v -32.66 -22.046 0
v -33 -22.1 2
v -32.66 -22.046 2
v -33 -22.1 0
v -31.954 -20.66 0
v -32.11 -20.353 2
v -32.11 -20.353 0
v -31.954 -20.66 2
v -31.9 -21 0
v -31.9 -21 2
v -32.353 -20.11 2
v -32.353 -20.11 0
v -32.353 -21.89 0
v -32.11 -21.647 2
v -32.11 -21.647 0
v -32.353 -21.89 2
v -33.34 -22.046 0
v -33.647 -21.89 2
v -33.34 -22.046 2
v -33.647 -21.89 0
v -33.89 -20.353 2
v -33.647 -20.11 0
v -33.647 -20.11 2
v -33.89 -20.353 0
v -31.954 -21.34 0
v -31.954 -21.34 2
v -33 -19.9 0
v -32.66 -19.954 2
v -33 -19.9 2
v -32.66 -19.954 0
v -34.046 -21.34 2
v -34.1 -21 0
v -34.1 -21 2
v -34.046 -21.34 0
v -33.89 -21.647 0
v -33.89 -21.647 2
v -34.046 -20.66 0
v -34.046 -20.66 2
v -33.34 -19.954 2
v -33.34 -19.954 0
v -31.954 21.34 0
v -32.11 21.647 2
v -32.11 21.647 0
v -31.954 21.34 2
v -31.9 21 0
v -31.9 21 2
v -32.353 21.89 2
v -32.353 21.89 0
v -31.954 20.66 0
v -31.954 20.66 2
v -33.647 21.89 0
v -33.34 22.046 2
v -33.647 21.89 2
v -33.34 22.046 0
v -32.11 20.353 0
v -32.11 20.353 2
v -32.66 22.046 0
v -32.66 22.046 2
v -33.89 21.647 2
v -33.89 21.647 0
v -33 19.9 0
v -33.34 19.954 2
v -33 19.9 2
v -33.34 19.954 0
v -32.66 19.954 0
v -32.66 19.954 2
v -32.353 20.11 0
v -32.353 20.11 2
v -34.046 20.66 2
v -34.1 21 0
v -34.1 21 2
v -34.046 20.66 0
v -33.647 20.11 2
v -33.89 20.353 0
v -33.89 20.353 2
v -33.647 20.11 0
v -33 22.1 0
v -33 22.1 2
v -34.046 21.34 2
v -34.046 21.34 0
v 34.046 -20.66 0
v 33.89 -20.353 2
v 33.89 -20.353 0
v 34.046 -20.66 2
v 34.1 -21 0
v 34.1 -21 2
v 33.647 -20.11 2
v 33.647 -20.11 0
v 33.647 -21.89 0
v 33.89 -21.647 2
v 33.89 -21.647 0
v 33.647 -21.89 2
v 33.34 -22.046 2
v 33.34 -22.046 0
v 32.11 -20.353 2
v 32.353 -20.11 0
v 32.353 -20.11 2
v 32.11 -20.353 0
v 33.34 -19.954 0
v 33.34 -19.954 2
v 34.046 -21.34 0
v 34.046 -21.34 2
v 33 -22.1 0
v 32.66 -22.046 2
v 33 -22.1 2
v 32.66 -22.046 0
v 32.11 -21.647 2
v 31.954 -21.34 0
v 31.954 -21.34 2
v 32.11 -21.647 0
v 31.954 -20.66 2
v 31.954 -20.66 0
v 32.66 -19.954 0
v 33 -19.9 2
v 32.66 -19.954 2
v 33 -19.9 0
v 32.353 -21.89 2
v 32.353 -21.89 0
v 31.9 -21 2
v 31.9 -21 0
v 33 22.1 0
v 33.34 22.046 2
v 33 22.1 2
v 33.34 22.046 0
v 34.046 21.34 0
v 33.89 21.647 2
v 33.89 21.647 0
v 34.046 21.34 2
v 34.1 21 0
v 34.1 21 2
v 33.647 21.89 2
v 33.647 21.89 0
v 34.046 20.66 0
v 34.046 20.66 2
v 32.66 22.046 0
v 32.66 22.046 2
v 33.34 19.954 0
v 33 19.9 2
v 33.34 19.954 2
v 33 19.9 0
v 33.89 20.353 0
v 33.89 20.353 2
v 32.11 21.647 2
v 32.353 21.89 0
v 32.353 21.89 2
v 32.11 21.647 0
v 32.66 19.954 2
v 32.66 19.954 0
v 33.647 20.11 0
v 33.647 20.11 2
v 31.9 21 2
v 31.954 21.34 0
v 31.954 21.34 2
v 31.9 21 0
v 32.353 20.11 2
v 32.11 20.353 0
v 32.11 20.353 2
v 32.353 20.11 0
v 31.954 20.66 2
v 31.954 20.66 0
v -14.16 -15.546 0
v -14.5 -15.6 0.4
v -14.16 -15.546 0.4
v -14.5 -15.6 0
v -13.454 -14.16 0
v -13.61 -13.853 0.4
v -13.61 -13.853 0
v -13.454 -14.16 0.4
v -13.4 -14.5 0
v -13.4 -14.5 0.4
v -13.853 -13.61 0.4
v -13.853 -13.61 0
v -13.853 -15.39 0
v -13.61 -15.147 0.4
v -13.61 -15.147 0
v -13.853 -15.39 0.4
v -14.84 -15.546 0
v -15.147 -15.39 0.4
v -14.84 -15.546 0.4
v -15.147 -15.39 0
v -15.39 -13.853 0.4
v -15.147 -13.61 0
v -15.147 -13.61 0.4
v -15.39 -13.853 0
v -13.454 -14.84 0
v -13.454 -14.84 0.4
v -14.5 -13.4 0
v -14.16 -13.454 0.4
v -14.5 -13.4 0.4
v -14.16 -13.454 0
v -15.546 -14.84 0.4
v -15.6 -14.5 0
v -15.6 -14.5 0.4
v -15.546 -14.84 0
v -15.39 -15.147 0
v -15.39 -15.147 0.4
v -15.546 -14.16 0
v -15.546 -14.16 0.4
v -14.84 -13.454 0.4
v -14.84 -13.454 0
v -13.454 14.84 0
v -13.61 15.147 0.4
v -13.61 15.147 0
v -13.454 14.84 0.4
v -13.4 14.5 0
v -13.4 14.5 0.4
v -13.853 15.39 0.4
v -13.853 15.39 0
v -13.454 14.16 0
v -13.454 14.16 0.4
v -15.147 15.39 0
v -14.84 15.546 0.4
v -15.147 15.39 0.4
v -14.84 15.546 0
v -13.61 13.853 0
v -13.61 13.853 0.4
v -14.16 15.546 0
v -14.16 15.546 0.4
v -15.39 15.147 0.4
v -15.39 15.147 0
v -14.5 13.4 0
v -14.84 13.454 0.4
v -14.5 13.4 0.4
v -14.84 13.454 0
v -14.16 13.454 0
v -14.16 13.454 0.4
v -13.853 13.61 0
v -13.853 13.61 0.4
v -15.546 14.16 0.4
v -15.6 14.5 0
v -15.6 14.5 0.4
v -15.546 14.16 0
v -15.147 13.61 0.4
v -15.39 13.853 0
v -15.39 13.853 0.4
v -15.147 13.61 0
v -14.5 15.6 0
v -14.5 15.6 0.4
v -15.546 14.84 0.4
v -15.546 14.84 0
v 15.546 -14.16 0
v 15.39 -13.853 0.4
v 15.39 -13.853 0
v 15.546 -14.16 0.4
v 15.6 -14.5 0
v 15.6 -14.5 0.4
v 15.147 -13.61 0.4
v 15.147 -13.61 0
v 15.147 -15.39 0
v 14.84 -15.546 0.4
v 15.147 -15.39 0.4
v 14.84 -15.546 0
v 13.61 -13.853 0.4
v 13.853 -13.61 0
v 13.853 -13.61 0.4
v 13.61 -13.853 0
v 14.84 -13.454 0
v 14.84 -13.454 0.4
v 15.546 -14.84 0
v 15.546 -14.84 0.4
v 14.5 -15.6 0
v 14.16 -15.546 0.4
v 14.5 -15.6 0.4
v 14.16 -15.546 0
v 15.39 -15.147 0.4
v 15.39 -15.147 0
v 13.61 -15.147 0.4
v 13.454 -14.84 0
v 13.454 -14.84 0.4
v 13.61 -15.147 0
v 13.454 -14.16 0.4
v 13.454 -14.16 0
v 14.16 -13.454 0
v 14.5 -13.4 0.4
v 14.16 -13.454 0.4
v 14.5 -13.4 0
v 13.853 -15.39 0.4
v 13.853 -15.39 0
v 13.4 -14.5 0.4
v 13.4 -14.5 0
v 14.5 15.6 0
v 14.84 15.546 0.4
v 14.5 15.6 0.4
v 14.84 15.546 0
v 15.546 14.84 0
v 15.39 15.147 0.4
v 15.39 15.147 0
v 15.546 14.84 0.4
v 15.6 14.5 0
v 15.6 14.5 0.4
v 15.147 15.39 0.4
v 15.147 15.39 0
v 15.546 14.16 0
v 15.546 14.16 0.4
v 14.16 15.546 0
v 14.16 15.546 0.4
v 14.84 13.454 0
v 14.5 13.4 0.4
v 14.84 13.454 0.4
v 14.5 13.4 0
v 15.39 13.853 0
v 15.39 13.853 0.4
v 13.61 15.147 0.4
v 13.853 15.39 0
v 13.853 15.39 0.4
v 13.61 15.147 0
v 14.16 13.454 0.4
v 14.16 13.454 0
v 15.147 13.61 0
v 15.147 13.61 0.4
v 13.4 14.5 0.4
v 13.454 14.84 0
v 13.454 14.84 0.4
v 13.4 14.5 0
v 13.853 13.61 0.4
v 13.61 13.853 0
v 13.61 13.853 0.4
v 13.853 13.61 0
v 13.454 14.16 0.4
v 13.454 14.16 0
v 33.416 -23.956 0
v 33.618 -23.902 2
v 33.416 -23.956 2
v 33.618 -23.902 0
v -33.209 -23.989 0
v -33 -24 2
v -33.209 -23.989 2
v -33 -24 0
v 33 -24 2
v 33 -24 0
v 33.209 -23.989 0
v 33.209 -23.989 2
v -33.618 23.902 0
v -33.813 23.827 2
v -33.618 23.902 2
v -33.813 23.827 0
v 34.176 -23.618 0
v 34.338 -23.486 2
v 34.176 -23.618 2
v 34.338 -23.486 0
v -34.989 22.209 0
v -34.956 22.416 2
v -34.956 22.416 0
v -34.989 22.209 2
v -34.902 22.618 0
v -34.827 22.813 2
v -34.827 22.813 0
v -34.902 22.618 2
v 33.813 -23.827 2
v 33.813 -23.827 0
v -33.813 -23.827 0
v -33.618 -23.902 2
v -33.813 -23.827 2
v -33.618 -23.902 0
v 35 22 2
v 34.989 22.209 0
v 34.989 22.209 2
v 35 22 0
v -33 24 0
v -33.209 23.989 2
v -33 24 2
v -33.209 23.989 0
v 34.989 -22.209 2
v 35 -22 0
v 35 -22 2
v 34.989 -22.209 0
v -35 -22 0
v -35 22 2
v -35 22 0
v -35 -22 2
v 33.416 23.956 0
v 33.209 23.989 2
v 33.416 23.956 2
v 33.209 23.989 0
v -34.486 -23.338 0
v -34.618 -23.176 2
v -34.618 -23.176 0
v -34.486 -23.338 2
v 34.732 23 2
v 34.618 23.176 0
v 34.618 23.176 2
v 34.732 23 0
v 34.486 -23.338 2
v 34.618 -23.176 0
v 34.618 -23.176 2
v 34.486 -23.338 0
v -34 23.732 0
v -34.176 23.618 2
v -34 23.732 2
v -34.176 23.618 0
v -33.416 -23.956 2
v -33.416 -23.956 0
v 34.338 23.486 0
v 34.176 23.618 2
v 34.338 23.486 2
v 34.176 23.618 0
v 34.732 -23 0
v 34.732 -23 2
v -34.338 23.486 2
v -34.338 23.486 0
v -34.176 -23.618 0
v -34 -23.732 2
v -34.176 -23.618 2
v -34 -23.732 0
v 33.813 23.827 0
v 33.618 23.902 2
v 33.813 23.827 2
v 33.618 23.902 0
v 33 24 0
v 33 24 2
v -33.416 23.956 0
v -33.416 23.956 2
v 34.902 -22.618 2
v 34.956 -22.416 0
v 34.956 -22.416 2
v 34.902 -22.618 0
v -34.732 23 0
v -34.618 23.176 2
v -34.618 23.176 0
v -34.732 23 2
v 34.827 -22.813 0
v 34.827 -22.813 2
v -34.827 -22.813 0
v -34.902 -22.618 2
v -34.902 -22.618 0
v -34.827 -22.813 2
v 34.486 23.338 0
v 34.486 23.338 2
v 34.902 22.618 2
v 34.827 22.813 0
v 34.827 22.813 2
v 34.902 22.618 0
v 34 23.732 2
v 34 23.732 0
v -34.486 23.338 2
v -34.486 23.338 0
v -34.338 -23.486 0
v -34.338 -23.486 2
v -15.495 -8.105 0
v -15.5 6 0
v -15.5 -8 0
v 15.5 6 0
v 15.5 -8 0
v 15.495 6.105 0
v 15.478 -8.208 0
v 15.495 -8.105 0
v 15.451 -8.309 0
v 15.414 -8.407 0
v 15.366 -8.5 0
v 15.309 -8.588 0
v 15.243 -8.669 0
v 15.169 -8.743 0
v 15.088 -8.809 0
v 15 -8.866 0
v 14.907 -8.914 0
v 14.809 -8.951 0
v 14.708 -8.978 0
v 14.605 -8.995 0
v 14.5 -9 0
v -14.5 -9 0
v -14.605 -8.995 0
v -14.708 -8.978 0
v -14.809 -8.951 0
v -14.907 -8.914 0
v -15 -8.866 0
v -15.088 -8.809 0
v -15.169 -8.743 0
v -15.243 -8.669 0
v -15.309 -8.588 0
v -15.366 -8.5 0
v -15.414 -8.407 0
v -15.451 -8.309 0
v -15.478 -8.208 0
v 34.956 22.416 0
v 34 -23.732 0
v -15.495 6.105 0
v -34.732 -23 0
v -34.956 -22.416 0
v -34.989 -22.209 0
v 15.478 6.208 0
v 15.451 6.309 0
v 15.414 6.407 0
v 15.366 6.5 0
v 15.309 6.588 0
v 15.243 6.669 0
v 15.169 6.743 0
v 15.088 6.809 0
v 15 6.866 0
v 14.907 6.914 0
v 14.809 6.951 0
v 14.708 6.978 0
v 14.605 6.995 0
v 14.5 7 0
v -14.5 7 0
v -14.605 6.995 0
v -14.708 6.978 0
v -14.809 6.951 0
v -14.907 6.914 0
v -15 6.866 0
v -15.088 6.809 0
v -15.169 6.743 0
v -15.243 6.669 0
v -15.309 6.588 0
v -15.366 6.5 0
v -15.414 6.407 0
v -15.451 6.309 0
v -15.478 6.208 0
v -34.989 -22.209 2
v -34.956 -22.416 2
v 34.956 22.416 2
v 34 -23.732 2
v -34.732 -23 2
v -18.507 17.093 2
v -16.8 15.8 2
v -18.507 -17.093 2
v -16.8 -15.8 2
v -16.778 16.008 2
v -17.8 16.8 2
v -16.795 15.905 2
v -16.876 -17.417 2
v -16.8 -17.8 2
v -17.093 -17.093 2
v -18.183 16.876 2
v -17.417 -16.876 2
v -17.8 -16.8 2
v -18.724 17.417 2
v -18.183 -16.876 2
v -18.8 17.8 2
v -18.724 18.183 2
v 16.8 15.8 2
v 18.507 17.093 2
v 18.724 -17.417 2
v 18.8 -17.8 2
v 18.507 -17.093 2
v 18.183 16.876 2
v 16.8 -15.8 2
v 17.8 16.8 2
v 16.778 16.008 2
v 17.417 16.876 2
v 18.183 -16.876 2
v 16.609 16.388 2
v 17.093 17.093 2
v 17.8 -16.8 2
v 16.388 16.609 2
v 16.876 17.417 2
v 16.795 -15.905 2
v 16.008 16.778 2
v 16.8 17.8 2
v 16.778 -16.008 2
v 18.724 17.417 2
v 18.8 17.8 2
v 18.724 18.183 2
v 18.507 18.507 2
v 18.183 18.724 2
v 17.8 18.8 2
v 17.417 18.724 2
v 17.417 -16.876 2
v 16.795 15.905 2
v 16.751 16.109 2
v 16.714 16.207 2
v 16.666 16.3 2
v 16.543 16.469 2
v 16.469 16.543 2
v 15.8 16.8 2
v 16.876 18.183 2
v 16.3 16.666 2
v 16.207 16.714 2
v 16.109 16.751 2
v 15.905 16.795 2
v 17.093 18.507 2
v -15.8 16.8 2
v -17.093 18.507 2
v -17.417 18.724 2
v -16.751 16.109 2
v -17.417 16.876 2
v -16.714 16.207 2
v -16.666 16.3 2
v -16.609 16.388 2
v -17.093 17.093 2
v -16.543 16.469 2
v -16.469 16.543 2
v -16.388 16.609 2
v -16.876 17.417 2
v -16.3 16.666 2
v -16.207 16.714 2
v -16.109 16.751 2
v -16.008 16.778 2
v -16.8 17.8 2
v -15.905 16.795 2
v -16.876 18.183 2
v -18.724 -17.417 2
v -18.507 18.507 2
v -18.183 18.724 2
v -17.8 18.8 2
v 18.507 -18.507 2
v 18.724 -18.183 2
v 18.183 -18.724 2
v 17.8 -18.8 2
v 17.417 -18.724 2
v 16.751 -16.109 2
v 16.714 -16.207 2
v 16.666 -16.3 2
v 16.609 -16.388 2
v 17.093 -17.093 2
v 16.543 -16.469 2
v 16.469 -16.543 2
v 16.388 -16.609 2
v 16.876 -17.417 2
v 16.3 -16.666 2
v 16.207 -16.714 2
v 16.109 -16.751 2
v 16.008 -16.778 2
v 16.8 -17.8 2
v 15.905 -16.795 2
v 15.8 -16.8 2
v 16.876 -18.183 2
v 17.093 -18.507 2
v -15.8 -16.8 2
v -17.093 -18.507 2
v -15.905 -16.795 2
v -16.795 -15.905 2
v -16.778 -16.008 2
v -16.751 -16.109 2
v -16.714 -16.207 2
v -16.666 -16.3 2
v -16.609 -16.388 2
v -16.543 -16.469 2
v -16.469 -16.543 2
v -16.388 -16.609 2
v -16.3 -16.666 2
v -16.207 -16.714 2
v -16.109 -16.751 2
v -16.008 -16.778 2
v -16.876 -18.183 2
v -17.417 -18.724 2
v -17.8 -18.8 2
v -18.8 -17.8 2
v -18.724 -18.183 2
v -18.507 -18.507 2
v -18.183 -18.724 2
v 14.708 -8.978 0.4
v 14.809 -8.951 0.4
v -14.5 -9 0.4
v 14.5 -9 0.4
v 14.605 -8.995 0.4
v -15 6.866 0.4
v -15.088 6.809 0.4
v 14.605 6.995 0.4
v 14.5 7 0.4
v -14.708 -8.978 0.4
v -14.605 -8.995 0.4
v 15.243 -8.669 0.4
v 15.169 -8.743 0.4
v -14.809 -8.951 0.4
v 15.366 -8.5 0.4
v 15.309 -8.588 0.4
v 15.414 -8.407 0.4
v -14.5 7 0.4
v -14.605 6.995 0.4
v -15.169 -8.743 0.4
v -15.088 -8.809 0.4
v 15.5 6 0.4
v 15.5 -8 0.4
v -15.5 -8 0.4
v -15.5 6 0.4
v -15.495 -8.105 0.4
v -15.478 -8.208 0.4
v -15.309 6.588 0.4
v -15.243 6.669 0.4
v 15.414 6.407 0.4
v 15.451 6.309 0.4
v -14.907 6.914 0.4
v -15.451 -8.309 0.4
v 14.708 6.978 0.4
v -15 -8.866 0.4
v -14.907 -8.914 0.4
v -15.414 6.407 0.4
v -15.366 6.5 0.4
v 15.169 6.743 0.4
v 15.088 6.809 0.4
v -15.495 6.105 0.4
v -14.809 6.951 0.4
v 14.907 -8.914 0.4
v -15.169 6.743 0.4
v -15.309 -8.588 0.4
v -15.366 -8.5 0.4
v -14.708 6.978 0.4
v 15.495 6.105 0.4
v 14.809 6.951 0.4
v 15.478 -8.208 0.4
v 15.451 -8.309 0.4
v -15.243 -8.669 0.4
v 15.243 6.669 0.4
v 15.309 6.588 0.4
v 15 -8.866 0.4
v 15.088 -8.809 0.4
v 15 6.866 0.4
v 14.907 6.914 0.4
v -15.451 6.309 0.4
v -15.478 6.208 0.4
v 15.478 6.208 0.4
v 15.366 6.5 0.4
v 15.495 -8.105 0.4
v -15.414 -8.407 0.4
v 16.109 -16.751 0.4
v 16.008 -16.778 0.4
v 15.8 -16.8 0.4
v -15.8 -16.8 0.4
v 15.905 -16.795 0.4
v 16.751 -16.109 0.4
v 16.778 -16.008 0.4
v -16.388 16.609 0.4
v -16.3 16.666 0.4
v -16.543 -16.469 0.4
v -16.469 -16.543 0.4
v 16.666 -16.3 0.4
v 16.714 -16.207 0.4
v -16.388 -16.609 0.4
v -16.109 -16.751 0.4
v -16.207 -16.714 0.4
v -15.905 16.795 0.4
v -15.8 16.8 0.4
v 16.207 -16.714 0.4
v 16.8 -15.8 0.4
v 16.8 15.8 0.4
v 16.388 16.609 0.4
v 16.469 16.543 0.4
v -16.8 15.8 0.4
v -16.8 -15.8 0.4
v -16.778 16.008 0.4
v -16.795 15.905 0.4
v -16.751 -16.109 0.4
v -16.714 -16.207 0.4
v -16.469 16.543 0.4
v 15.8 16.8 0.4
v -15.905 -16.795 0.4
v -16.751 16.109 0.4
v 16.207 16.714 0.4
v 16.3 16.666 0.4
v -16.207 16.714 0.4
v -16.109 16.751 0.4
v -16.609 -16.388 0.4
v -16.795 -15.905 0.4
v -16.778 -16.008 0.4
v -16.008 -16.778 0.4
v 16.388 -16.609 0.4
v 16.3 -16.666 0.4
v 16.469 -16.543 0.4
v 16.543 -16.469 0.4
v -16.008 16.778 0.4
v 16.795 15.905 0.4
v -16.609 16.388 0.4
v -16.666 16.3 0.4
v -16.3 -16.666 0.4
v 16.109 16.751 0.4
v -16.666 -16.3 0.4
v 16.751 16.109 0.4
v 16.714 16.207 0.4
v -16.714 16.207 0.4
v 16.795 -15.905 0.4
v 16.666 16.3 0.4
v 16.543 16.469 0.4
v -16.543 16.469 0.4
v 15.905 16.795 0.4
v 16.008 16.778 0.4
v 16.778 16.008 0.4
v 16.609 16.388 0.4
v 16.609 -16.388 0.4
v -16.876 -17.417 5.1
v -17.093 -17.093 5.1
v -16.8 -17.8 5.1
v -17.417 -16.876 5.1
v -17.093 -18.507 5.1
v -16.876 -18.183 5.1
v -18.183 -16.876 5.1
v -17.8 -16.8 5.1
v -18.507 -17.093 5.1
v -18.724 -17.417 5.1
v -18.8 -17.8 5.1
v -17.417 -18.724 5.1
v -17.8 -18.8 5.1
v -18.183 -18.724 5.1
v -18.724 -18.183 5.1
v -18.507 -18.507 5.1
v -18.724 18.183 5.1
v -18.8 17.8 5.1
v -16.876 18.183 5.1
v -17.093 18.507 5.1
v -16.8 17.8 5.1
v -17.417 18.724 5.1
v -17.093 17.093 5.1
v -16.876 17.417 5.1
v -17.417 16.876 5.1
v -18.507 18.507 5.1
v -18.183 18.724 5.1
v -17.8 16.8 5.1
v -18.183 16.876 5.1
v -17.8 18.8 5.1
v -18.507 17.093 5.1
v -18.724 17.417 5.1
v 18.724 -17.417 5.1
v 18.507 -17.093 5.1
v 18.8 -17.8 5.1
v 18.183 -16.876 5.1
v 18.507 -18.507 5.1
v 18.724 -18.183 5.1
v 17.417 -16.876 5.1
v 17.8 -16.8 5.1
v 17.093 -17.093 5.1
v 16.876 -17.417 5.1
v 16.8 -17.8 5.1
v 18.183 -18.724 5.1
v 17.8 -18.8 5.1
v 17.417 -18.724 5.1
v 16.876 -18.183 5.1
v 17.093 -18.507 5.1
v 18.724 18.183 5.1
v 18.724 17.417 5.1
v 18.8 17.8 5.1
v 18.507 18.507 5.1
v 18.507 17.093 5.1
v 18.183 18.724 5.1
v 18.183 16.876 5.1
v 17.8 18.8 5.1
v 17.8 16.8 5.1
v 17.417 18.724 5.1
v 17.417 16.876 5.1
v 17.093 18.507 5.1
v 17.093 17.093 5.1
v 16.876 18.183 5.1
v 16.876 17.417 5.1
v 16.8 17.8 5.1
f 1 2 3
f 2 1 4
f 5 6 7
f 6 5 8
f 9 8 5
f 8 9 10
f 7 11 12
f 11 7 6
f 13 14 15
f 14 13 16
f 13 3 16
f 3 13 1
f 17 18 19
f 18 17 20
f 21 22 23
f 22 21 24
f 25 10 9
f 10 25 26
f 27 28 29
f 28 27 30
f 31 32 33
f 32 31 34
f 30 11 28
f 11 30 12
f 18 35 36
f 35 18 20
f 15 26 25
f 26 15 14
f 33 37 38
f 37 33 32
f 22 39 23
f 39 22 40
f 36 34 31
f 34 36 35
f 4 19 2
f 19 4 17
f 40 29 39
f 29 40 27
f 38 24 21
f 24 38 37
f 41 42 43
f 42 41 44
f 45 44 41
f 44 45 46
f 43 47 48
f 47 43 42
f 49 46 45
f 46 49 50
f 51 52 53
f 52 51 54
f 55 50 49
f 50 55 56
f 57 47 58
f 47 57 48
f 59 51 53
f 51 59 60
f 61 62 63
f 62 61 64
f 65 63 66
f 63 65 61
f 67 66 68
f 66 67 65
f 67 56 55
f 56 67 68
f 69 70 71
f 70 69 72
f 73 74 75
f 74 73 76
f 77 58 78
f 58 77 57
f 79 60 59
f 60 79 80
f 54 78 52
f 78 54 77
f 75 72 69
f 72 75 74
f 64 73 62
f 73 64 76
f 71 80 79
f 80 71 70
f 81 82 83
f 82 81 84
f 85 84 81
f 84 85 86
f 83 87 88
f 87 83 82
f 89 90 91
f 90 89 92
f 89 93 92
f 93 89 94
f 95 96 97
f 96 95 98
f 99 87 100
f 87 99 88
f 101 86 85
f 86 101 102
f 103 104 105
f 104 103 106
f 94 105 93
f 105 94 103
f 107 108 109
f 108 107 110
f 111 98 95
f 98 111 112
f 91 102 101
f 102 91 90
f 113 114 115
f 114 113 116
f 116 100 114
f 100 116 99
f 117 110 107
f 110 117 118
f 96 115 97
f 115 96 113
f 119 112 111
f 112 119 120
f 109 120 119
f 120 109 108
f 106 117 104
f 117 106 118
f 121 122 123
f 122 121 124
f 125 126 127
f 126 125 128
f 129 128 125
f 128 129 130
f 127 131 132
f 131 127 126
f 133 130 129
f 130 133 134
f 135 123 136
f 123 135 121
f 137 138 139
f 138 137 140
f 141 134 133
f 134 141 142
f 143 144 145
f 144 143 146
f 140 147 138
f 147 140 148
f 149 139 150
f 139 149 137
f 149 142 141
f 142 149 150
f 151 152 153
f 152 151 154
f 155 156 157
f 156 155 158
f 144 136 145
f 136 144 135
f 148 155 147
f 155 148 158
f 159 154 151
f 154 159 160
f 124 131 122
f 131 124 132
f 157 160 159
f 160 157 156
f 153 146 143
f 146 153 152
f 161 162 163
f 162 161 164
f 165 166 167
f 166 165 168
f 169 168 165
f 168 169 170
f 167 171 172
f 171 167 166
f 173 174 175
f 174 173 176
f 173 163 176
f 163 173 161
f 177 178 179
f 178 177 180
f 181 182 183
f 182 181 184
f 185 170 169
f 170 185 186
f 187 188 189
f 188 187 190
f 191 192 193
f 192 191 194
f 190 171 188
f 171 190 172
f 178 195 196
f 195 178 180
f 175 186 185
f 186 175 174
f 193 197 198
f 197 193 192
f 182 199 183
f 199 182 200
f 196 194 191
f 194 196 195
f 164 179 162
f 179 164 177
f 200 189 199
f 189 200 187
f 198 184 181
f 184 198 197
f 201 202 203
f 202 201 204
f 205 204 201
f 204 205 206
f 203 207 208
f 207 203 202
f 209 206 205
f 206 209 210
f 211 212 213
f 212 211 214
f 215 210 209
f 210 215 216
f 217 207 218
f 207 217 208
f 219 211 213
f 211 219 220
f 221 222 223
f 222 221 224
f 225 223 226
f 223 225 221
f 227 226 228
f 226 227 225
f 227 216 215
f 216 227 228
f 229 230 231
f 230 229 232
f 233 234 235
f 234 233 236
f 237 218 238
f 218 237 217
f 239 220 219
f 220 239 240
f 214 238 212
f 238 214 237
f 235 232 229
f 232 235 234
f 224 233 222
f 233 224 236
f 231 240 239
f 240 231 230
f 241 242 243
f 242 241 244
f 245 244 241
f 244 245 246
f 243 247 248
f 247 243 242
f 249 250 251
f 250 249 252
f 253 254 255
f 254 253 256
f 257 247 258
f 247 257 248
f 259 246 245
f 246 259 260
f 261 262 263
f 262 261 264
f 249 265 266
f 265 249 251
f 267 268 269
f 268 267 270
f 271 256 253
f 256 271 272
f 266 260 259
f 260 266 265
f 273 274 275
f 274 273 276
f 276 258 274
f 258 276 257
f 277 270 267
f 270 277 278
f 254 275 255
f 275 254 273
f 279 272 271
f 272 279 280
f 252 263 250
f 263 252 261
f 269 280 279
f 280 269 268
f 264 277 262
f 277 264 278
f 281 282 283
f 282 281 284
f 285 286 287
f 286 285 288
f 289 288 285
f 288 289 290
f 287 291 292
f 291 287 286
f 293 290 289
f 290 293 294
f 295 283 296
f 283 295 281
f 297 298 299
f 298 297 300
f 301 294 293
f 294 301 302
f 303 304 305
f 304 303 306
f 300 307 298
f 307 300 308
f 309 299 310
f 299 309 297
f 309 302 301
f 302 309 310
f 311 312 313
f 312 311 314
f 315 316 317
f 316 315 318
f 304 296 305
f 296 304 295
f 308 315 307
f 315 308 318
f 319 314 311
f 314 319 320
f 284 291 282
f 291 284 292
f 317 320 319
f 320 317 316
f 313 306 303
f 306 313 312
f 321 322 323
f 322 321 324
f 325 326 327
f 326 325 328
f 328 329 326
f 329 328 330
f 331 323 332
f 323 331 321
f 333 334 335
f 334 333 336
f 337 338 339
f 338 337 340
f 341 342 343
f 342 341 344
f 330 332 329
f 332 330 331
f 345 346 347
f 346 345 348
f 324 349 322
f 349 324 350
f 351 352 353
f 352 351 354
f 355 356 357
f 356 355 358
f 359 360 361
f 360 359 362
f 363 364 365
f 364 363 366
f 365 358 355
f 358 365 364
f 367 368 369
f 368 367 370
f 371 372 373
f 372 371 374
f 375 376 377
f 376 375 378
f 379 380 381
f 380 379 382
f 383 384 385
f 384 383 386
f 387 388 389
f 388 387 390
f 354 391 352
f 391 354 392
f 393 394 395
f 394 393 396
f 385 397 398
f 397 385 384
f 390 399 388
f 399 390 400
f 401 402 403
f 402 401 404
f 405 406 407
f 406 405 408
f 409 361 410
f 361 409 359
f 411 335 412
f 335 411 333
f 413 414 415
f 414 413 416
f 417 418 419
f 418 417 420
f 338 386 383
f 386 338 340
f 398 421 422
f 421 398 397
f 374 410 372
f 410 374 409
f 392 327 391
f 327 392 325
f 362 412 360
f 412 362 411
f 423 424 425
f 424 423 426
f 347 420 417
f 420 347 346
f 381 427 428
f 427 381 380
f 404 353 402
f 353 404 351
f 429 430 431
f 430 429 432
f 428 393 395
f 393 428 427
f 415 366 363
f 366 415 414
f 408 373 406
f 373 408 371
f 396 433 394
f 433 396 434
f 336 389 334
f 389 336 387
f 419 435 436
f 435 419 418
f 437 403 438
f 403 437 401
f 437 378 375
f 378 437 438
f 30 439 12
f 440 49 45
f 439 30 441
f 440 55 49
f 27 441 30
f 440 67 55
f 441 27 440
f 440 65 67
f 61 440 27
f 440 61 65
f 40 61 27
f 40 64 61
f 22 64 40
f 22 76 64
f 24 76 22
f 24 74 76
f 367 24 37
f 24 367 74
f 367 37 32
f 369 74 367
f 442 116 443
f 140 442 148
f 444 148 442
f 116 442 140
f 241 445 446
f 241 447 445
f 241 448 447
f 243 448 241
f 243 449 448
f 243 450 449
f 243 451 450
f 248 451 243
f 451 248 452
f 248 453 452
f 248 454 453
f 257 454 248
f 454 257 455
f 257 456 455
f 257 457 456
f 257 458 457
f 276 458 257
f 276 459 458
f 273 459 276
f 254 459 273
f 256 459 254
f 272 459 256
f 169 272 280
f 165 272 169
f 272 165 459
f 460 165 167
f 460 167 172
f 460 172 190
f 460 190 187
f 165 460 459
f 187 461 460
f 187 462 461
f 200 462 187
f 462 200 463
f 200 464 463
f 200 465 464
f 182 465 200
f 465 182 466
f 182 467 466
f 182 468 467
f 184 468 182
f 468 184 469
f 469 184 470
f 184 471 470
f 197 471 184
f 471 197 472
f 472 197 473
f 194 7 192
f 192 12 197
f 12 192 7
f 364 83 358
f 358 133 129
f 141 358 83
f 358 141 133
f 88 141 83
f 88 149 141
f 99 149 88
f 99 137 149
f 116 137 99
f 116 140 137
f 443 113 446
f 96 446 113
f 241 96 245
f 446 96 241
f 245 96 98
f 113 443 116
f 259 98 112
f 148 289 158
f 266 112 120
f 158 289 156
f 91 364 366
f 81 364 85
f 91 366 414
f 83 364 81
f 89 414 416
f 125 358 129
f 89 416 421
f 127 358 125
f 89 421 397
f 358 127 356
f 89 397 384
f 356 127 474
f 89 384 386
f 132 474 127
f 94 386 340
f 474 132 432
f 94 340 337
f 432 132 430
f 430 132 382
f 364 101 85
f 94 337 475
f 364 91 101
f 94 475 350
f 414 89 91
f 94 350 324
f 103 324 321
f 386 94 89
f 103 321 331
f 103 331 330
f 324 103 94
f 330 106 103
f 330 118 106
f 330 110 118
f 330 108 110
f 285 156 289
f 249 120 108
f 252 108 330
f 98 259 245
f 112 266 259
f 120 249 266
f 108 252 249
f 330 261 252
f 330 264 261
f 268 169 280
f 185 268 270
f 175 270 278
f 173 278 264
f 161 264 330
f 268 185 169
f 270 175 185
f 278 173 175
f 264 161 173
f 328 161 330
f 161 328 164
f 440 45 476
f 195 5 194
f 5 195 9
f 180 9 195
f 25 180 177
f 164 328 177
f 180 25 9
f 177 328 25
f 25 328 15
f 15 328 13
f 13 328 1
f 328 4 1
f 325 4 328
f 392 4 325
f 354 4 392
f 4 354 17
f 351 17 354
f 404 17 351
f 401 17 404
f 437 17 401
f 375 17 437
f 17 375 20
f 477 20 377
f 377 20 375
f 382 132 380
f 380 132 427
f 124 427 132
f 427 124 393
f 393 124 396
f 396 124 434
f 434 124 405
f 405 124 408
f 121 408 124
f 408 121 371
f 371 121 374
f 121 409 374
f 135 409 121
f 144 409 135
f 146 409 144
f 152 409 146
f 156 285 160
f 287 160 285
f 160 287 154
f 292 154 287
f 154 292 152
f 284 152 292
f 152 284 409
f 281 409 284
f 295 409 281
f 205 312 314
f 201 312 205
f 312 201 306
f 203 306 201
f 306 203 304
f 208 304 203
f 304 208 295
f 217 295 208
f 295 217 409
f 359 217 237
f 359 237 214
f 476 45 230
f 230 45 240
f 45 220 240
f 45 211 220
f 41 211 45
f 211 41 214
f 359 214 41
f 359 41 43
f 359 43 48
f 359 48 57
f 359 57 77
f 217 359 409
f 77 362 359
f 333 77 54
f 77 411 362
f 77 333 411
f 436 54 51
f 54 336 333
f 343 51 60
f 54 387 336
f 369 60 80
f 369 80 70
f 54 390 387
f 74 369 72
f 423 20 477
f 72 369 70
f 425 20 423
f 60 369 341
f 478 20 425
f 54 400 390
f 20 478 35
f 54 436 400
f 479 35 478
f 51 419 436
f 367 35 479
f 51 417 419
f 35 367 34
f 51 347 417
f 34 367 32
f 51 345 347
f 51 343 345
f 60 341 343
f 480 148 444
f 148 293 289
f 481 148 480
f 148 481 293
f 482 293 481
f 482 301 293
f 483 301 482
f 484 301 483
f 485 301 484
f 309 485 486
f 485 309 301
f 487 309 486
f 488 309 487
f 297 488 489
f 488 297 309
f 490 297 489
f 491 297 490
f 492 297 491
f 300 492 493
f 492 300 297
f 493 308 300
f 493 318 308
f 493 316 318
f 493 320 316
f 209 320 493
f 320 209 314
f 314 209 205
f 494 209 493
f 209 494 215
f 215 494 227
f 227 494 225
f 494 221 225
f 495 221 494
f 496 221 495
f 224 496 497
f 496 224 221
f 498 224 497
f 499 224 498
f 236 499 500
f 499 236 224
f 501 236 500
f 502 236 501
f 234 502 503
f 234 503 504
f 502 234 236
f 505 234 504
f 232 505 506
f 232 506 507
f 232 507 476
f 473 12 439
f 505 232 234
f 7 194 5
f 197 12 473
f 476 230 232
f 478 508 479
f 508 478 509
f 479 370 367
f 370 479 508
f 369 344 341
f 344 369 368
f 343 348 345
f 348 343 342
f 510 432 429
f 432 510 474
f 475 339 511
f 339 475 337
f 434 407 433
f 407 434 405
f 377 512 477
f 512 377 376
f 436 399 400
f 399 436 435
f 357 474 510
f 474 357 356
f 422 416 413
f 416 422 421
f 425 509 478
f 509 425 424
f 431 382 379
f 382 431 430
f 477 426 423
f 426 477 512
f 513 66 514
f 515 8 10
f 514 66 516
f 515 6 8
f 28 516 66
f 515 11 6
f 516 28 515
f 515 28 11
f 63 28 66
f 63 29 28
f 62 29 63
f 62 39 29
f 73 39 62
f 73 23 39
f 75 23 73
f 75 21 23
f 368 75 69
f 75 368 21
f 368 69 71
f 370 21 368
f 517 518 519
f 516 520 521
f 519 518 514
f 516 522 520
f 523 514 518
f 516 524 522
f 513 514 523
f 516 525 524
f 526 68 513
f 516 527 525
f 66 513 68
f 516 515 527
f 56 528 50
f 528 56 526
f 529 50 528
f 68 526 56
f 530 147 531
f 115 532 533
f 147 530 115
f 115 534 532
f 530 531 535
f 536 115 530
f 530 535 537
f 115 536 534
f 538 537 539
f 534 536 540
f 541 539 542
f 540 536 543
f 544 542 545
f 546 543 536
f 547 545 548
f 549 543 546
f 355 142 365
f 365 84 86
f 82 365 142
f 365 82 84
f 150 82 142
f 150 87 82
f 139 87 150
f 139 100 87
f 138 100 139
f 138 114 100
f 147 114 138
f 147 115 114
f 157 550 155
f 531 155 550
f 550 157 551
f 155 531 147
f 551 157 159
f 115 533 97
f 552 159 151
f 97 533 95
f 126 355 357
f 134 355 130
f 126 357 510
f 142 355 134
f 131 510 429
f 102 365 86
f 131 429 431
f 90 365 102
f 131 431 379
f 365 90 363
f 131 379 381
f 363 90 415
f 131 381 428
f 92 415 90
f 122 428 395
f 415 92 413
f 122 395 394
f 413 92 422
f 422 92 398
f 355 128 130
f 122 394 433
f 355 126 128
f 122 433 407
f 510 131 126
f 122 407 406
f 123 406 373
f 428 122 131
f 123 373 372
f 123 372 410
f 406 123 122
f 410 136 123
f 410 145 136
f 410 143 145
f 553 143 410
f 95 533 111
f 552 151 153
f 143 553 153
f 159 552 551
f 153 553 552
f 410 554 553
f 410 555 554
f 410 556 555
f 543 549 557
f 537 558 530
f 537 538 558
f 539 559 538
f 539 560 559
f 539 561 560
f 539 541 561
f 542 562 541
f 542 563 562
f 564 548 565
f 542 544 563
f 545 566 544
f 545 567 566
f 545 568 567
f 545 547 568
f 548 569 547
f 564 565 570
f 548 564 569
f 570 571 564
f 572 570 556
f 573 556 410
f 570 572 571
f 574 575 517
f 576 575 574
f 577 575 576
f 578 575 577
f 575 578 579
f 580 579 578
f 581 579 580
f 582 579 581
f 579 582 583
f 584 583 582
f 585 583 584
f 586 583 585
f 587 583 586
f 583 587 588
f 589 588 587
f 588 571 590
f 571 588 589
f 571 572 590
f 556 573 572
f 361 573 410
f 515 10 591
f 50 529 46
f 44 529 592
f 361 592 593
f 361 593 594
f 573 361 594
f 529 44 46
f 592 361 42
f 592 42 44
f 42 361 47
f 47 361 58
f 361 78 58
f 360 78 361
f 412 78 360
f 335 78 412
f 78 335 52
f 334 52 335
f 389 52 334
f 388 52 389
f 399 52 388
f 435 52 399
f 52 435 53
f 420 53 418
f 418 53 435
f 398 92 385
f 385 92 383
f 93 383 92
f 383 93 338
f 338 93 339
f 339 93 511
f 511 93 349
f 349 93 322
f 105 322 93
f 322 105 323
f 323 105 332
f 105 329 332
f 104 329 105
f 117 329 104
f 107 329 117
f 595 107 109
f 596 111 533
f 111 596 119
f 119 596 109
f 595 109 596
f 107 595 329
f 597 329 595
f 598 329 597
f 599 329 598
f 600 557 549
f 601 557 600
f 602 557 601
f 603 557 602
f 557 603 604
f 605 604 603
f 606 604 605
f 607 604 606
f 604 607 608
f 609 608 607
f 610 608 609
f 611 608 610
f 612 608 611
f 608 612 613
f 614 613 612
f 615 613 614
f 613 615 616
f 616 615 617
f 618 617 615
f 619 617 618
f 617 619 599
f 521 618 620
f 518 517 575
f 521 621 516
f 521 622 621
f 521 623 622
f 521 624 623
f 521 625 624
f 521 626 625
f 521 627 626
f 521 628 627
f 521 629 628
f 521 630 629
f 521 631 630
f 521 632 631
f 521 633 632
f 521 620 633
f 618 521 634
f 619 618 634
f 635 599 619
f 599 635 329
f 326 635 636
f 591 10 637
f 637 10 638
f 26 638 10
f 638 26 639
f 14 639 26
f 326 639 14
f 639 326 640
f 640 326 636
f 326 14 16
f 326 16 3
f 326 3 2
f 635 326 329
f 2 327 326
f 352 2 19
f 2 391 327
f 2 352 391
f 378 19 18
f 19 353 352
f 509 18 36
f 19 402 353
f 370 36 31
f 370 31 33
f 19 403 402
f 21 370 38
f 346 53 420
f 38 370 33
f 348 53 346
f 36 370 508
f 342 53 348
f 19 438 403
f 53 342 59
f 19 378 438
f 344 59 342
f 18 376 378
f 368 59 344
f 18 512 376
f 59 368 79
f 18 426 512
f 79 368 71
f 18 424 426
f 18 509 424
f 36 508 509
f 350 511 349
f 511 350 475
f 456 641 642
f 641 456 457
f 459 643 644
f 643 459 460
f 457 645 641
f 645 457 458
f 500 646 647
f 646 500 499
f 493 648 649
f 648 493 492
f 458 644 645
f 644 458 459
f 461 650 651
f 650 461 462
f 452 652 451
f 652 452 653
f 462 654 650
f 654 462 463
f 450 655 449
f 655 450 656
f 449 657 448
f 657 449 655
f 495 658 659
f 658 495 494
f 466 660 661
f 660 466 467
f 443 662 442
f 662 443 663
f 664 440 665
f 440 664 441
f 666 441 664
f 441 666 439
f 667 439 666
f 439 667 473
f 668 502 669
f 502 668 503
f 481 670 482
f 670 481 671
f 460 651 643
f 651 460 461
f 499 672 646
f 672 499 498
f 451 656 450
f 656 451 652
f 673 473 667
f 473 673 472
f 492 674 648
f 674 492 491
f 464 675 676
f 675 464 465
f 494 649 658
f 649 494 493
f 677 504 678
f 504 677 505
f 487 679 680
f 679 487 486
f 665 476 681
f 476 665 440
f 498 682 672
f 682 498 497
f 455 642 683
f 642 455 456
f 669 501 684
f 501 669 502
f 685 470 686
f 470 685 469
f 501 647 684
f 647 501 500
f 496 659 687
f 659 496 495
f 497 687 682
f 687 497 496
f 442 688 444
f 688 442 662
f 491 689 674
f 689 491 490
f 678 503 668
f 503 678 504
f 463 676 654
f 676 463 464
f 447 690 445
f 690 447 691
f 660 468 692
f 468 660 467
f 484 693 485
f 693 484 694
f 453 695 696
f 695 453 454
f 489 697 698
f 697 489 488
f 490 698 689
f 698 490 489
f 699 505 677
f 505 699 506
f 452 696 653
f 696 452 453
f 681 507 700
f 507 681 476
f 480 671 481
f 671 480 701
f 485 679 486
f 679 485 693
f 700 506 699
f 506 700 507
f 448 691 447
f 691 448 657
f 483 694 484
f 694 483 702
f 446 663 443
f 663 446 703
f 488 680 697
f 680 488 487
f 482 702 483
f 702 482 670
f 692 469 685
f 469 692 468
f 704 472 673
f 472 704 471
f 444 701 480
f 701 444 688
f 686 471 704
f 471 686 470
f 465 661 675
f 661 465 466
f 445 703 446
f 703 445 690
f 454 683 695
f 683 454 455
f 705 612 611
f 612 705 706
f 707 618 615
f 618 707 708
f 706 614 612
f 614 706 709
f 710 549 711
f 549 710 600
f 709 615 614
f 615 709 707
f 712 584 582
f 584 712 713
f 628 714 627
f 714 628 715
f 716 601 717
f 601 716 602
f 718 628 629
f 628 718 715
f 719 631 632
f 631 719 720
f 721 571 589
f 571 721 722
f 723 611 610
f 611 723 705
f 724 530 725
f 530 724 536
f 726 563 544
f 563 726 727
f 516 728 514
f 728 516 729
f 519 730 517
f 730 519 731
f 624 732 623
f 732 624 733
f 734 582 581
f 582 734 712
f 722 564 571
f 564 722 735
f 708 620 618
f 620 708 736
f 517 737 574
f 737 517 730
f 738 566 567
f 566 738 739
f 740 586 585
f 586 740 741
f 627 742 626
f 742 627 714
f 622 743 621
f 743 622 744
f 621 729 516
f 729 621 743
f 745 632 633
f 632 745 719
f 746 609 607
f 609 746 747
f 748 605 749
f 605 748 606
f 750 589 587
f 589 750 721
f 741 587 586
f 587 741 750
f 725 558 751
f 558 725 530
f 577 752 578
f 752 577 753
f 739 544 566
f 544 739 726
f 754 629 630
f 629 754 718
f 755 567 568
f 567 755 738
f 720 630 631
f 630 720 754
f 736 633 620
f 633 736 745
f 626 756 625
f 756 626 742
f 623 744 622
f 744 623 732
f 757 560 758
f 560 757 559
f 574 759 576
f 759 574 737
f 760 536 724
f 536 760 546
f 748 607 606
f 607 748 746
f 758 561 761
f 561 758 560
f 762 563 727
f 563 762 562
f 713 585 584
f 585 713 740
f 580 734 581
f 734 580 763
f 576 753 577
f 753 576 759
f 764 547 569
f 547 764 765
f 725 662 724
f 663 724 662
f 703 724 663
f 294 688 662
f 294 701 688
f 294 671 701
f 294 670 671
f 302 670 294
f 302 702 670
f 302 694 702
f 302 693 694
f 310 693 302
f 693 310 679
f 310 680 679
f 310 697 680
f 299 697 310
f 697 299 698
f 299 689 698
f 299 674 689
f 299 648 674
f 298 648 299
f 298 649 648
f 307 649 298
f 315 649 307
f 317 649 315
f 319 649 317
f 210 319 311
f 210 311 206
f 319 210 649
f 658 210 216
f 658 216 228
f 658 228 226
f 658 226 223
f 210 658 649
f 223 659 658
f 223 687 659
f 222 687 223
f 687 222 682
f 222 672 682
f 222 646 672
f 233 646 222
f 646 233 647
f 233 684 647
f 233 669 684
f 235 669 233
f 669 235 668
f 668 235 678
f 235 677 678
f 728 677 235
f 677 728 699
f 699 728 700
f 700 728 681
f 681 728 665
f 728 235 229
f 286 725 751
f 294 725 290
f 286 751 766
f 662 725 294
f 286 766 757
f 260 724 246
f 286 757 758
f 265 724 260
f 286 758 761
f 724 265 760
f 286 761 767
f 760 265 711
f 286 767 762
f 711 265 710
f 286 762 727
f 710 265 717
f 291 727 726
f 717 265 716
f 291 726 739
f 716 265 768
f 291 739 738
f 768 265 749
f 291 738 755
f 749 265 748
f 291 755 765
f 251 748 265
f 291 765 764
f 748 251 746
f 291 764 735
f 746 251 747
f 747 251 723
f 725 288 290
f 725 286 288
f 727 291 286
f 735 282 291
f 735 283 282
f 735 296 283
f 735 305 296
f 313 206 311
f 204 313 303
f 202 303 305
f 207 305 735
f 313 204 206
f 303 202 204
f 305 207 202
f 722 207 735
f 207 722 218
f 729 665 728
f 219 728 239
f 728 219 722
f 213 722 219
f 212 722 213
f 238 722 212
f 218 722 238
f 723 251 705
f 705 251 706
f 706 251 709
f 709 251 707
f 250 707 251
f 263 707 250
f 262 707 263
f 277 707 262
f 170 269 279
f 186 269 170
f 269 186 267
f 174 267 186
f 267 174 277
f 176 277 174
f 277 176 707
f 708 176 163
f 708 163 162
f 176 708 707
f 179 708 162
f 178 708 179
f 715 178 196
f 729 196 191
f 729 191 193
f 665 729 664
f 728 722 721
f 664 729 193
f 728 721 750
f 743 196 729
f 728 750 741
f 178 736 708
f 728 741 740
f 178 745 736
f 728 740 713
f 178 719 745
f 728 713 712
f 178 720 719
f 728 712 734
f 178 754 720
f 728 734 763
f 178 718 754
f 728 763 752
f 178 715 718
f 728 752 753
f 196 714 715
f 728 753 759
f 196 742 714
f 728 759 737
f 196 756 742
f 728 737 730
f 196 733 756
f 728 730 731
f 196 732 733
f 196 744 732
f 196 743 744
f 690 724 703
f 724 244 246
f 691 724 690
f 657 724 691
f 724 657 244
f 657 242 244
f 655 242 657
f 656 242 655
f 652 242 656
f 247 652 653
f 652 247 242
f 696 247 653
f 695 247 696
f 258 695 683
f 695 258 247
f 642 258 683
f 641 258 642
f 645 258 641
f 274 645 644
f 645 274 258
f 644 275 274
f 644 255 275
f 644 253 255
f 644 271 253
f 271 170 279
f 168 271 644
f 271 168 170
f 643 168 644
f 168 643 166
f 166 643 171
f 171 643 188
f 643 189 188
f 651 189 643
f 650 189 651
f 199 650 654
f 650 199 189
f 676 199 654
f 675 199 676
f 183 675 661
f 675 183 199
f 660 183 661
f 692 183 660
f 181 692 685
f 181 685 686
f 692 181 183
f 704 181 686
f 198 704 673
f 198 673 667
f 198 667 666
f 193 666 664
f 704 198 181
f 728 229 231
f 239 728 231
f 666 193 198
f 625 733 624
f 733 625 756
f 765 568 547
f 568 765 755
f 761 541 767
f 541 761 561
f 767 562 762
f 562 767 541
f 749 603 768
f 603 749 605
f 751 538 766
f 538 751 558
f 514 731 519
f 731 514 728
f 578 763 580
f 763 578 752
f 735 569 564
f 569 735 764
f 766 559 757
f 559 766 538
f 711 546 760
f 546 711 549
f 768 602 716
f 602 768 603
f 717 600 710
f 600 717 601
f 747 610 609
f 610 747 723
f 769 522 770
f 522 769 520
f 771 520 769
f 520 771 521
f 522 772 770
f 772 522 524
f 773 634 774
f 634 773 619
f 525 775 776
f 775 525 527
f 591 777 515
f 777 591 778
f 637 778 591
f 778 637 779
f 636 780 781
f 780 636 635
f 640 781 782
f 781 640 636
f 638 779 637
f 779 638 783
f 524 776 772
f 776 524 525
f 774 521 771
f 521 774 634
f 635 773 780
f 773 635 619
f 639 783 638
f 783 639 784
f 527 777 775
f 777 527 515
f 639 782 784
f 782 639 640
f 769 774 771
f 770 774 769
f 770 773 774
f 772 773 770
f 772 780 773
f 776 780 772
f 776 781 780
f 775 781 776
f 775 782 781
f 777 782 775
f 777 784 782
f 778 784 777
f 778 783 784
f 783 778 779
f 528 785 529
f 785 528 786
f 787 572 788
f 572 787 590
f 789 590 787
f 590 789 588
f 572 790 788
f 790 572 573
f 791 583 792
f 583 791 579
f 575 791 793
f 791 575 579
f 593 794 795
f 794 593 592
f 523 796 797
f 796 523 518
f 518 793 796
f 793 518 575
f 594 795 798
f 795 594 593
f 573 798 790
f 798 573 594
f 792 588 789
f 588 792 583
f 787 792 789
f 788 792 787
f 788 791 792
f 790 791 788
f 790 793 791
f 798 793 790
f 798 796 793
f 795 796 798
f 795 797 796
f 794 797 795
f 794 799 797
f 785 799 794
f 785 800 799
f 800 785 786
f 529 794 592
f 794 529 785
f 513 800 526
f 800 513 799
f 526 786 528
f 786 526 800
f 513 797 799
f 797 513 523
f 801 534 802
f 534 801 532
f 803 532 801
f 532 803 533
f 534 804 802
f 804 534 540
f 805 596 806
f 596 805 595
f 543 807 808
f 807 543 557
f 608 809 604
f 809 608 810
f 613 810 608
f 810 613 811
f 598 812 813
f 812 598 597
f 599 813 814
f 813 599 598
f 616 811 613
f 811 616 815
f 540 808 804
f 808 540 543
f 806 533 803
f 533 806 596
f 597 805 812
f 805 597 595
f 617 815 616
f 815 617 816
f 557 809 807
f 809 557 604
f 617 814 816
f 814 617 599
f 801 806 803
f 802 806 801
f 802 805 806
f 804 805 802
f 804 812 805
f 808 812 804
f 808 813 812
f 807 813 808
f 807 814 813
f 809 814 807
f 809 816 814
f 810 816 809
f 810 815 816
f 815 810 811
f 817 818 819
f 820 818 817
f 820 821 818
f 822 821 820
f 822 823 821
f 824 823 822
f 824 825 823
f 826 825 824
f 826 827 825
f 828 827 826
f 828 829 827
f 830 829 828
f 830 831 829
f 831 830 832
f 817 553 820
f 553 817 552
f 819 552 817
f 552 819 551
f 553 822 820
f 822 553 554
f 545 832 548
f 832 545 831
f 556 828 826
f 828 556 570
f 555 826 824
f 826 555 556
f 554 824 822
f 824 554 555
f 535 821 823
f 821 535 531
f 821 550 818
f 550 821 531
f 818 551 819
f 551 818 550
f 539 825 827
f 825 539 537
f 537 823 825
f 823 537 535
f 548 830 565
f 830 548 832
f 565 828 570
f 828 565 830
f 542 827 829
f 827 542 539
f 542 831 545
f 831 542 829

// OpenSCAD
// Roam Screen Adapter — mounts small 1.3" SH1106 in big case's 2.42" screen opening
// Print in PLA, glue into place on the shelf
//
// The big case has:
//   - Screen window cutout: 55mm x 29mm
//   - M2 mounting holes: 64mm x 42mm spacing
//   - Shelf at Z=20mm
//
// The small screen is:
//   - Board: 33mm x 33mm
//   - Visible area: 30mm x 15mm (3mm inset from sides, 8mm from top)
//   - Mounting holes: 27mm x 27mm spacing, M2

include <common.scad>

// Adapter plate dimensions — matches the large screen board footprint
// so it uses the same mounting holes
adapter_w = oled_lg_board_w;    // 70mm
adapter_h = oled_lg_board_h;    // 48mm
adapter_thick = 2.0;            // 2mm thick PLA

// Small screen sits centered on the adapter
// Center the small board on the adapter
sm_offset_x = 0;  // centered in X
sm_offset_y = 0;   // centered in Y

// Visible area window — slightly larger than small screen's visible area
// for tolerance
window_w = oled_sm_vis_w + 1;   // 31mm
window_h = oled_sm_vis_h + 1;   // 16mm

// Window position relative to small board center
// Visible area is 3mm from sides (centered in X), 8mm from top edge
// Board is 33mm tall, vis area starts 8mm from top, is 15mm tall
// Center of vis area from board center: -(33/2) + 8 + 15/2 = -16.5 + 8 + 7.5 = -1
window_offset_y = -(oled_sm_board_h/2) + oled_sm_vis_top + oled_sm_vis_h/2;

// Corner rounding
corner_r = 2;

// Lip to hold the small screen board (raised rim around the board pocket)
pocket_depth = 1.6;  // PCB thickness
pocket_clearance = 0.3;  // per side

module screen_adapter() {
    difference() {
        // Main plate with rounded corners
        linear_extrude(adapter_thick)
            offset(r=corner_r) offset(r=-corner_r)
                square([adapter_w, adapter_h], center=true);

        // Window cutout for small screen visible area
        translate([sm_offset_x, sm_offset_y + window_offset_y, -1])
            linear_extrude(adapter_thick + 2)
                offset(r=1) offset(r=-1)
                    square([window_w, window_h], center=true);

        // Board pocket — recess for the small screen PCB to sit in
        translate([sm_offset_x, sm_offset_y, adapter_thick - pocket_depth])
            linear_extrude(pocket_depth + 1)
                offset(r=1) offset(r=-1)
                    square([oled_sm_board_w + pocket_clearance*2,
                            oled_sm_board_h + pocket_clearance*2], center=true);

        // Large screen mounting holes (M2 clearance, for mounting adapter to case)
        for (dx = [-1, 1], dy = [-1, 1])
            translate([dx * oled_lg_hole_sp_w/2, dy * oled_lg_hole_sp_h/2, -1])
                cylinder(d=m2_screw_dia, h=adapter_thick + 2, $fn=20);

        // Small screen mounting holes (M2, for screwing small screen to adapter)
        for (dx = [-1, 1], dy = [-1, 1])
            translate([sm_offset_x + dx * oled_sm_hole_sp/2,
                       sm_offset_y + dy * oled_sm_hole_sp/2, -1])
                cylinder(d=m2_screw_dia, h=adapter_thick + 2, $fn=20);
    }

    // Alignment posts around the small board pocket corners
    // These help position the small screen during assembly
    post_h = pocket_depth + 1.5;  // stick up above the pocket floor
    post_w = 2;
    for (dx = [-1, 1], dy = [-1, 1]) {
        // Position posts at corners of the board pocket
        px = sm_offset_x + dx * (oled_sm_board_w/2 + pocket_clearance + post_w/2);
        py = sm_offset_y + dy * (oled_sm_board_h/2 + pocket_clearance + post_w/2);
        translate([px, py, 0])
            cylinder(d=post_w, h=adapter_thick + post_h, $fn=16);
    }
}

// Render
screen_adapter();
